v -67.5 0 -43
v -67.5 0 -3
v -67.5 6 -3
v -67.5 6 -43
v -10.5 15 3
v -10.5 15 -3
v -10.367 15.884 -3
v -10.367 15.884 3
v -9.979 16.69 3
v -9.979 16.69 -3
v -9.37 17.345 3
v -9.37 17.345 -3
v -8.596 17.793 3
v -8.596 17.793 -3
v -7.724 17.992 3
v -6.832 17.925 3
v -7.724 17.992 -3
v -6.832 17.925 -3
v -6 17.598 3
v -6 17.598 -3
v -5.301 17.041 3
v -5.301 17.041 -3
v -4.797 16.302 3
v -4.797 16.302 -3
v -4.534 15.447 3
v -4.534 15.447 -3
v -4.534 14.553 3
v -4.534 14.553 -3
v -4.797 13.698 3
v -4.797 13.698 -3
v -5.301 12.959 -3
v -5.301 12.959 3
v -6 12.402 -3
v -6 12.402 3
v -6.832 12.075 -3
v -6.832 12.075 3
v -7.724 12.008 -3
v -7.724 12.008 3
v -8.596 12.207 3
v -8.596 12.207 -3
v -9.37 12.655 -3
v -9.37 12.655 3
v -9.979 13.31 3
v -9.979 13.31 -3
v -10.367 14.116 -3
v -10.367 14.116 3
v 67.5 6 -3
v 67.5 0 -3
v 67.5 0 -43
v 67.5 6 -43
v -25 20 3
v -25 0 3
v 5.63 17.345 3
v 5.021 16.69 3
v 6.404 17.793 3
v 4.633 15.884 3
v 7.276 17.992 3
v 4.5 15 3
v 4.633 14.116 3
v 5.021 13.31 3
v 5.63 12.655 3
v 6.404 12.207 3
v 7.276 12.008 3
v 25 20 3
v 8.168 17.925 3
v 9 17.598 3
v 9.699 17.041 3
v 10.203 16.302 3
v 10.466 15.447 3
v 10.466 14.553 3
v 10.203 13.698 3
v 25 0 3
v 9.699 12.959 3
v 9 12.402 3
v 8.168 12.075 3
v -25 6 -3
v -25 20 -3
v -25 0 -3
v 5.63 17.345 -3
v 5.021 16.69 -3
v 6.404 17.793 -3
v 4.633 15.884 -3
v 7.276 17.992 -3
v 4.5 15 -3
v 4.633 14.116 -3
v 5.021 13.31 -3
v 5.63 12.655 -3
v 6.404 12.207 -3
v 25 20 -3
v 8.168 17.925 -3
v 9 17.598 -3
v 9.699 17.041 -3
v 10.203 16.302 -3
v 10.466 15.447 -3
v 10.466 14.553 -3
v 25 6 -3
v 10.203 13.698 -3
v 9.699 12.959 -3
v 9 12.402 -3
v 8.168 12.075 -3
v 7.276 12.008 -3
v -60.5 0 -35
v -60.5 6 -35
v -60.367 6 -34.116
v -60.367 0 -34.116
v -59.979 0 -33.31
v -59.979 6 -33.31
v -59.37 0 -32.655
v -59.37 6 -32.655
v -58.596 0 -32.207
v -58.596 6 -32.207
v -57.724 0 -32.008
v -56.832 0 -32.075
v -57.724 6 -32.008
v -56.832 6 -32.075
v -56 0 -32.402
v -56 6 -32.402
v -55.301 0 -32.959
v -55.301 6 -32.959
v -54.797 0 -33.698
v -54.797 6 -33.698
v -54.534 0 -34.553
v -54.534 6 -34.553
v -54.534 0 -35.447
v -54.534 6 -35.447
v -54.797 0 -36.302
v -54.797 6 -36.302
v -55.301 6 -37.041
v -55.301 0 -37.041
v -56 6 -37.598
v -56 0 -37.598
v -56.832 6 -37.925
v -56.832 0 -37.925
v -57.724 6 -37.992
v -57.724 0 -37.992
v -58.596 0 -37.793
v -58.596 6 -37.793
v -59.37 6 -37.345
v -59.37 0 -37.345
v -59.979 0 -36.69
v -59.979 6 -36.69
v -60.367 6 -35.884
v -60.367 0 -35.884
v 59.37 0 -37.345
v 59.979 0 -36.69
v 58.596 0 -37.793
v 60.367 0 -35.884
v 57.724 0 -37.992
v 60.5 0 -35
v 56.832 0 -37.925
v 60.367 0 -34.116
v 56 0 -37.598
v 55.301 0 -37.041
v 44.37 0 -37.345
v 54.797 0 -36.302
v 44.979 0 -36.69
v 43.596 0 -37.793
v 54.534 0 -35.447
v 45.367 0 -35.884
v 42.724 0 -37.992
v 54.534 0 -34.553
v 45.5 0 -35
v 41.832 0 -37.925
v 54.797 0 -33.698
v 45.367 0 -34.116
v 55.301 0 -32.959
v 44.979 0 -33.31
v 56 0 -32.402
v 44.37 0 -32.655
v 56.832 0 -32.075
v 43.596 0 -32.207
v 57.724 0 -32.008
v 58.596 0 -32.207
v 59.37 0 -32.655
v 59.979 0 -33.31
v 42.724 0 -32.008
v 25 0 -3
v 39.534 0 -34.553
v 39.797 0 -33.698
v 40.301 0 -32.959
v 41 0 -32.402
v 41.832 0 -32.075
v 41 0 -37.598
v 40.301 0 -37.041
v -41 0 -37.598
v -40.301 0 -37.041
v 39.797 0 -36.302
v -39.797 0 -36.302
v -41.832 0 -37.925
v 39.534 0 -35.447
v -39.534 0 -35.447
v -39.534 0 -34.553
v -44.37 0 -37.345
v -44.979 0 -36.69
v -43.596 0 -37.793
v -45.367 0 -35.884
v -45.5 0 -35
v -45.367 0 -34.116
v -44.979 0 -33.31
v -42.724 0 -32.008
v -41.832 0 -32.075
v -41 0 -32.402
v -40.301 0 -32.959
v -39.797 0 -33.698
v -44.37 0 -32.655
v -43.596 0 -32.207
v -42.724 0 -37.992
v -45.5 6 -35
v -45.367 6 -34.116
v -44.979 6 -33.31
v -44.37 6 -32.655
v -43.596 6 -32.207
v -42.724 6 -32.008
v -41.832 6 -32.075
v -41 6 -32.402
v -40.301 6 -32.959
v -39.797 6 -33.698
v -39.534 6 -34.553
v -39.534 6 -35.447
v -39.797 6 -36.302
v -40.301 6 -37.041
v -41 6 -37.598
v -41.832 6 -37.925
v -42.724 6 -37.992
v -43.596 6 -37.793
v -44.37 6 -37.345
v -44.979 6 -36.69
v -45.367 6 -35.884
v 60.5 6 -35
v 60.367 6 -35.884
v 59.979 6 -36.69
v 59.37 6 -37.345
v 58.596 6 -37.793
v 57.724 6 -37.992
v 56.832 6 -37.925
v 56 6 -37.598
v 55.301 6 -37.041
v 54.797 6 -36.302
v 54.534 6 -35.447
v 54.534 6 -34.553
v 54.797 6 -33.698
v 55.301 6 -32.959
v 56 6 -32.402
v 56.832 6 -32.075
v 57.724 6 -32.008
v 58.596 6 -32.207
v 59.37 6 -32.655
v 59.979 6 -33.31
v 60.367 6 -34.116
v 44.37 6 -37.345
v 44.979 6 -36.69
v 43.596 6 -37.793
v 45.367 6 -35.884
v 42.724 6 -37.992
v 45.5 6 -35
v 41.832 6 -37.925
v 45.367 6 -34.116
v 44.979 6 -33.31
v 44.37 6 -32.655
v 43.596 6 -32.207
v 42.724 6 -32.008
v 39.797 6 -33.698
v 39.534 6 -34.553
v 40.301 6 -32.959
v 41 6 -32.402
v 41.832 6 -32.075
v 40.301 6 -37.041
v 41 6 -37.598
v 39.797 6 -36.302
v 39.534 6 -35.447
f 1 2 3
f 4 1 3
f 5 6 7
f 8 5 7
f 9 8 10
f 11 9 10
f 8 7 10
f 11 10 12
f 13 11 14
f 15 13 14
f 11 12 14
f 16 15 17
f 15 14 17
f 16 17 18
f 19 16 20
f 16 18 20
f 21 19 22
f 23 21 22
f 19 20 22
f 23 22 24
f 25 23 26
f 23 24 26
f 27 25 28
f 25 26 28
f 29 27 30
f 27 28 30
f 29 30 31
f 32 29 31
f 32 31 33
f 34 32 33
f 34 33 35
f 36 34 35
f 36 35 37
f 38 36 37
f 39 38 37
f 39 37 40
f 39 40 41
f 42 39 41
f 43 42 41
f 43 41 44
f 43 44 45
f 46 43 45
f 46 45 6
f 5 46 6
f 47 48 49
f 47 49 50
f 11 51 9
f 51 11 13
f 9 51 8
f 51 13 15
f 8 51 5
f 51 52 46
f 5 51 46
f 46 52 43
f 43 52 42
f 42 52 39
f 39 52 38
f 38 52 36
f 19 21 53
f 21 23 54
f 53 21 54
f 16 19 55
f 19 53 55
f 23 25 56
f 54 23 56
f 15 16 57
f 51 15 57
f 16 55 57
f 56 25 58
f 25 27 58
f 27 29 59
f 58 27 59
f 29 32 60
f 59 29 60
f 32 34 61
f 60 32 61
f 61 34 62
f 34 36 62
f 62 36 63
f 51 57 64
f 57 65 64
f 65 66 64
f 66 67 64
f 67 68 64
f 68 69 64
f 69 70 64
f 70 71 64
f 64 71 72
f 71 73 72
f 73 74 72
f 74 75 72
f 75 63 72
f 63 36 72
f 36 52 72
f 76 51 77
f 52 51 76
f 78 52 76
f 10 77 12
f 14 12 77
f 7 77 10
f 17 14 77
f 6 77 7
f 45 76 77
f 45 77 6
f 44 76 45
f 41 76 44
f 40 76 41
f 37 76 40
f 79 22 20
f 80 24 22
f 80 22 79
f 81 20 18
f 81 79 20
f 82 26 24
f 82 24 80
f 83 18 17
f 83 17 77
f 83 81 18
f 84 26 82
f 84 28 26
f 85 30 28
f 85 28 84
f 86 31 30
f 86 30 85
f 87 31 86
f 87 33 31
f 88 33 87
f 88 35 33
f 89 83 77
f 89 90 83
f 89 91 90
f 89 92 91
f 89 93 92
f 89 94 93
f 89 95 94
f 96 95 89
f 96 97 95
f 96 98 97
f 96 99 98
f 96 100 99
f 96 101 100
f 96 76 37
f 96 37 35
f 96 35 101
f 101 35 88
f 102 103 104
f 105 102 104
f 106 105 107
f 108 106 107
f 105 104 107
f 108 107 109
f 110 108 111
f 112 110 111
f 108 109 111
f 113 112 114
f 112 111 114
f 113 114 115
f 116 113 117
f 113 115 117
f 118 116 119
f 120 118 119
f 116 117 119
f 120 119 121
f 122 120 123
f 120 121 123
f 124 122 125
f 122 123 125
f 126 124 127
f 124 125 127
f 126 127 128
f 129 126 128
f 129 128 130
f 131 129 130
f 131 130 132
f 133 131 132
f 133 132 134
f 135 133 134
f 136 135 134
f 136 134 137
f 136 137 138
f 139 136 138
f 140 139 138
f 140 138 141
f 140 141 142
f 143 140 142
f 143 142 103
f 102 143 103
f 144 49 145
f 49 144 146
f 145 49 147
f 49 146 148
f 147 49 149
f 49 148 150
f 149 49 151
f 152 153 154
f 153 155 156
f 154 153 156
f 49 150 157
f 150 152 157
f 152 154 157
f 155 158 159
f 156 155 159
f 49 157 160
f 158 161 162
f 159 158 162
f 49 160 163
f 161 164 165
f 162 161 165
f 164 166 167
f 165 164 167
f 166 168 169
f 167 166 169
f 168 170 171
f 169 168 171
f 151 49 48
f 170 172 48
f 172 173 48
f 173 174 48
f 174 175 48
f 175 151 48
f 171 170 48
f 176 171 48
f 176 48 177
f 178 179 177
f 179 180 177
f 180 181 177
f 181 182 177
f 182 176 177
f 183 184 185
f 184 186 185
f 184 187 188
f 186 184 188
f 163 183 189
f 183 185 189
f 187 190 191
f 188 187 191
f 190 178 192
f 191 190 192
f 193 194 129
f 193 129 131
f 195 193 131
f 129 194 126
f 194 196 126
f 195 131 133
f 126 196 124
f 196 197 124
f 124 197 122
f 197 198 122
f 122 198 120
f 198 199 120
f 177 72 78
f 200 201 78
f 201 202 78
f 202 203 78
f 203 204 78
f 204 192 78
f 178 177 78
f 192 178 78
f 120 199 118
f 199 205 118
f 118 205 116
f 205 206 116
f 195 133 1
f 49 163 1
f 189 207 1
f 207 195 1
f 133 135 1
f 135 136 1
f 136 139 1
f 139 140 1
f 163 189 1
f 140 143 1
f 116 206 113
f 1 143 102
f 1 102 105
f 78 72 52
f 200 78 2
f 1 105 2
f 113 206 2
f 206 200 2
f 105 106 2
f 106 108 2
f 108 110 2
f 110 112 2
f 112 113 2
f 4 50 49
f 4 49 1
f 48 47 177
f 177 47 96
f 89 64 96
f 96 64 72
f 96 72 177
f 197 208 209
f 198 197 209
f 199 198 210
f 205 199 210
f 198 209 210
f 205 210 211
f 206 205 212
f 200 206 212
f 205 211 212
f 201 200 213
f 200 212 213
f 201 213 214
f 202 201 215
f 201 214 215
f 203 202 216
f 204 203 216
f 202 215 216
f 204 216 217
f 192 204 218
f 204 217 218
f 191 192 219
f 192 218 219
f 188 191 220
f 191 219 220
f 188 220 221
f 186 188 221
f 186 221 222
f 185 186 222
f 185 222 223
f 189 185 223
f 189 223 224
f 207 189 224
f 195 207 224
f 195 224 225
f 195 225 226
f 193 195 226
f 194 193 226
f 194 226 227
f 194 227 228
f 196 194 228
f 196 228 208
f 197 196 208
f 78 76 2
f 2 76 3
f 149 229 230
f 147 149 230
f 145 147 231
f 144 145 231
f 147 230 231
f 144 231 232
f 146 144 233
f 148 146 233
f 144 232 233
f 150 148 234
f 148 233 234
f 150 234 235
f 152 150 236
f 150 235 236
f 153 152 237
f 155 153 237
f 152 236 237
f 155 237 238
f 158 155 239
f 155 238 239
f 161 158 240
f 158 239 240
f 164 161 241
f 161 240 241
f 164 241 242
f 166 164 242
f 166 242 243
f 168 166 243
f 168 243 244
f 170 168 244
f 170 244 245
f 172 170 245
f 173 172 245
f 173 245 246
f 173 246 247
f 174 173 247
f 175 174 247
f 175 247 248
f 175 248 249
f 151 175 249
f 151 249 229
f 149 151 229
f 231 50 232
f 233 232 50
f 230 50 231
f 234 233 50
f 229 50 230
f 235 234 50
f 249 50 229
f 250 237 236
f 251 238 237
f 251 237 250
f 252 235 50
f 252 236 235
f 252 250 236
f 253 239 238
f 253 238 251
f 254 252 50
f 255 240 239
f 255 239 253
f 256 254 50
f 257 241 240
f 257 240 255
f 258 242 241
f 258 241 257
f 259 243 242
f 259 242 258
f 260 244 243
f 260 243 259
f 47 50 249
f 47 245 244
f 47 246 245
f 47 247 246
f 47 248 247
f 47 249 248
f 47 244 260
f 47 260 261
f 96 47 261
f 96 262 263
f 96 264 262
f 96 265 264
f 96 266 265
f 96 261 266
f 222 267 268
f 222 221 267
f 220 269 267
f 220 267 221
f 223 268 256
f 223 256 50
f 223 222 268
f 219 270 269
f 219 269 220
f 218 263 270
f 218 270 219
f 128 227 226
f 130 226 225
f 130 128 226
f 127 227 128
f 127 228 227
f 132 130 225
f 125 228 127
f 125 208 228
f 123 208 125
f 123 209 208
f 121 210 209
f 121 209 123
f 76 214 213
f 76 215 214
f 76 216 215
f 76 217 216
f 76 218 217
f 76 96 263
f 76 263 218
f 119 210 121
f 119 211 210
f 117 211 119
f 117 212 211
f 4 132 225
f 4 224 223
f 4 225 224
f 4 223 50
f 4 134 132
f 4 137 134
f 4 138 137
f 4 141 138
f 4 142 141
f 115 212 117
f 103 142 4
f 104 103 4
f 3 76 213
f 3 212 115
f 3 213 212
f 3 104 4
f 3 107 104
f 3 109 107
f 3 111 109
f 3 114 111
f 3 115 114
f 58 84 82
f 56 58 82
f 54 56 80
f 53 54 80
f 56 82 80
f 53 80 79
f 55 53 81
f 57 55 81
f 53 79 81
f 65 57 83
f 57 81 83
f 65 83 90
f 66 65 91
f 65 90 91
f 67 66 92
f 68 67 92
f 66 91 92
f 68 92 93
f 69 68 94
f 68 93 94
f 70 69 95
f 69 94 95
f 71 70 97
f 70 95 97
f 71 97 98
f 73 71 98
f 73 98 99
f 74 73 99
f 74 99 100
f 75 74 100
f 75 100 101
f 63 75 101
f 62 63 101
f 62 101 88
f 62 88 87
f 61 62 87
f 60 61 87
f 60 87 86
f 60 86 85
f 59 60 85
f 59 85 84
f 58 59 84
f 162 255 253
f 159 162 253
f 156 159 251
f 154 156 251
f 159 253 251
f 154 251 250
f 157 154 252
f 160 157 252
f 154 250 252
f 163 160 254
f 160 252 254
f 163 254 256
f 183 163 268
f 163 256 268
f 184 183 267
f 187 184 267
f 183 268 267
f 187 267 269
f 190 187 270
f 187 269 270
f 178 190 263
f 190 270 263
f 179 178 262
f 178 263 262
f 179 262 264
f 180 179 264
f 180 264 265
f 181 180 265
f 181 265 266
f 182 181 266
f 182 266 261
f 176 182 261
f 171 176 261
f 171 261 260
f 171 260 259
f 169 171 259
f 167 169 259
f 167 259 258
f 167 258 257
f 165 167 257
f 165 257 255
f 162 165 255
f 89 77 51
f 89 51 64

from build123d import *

# Parameters (mm, degrees)
SKETCH1_W           = 50
SKETCH1_H           = 6
BOSS_EXTRUDE1_DEPTH = 20
SKETCH2_R           = 3
CUT_EXTRUDE1_DEPTH  = 33.57299495
SKETCH3_W           = 135
SKETCH3_H           = 6
BOSS_EXTRUDE2_DEPTH = 40
SKETCH4_R           = 3
CUT_EXTRUDE2_DEPTH  = 82.2480769


with BuildPart() as part:
    # Sketch1 → Boss-Extrude1 (new body)
    with BuildSketch(Plane(origin=(0, 0, 0), x_dir=(1, 0, 0), z_dir=(0, 1, 0))):
        Rectangle(SKETCH1_W, SKETCH1_H)
    extrude(amount=BOSS_EXTRUDE1_DEPTH)

    # Sketch2 → Cut-Extrude1 (cut, through all)
    with BuildSketch(Plane(origin=(0, 0, -3), x_dir=(-1, 0, 0), z_dir=(0, 0, -1))):
        with Locations((-7.5, 15)):
            Circle(SKETCH2_R)
        with Locations((7.5, 15)):
            Circle(SKETCH2_R)
    extrude(amount=-CUT_EXTRUDE1_DEPTH, mode=Mode.SUBTRACT)

    # Sketch3 → Boss-Extrude2 (add)
    with BuildSketch(Plane(origin=(0, 0, -3), x_dir=(-1, 0, 0), z_dir=(0, 0, -1))):
        with Locations((0, 3)):
            Rectangle(SKETCH3_W, SKETCH3_H)
    extrude(amount=BOSS_EXTRUDE2_DEPTH)

    # Sketch4 → Cut-Extrude2 (cut, through all)
    with BuildSketch(Plane(origin=(0, 6, 0), x_dir=(1, 0, 0), z_dir=(0, 1, 0))):
        with Locations(Location((-57.5, 35, 0), (0, 0, 180))):
            Circle(SKETCH4_R)
        with Locations(Location((-42.5, 35, 0), (0, 0, 180))):
            Circle(SKETCH4_R)
        with Locations((42.5, 35)):
            Circle(SKETCH4_R)
        with Locations((57.5, 35)):
            Circle(SKETCH4_R)
    extrude(amount=-CUT_EXTRUDE2_DEPTH, mode=Mode.SUBTRACT)


solid = part.part
